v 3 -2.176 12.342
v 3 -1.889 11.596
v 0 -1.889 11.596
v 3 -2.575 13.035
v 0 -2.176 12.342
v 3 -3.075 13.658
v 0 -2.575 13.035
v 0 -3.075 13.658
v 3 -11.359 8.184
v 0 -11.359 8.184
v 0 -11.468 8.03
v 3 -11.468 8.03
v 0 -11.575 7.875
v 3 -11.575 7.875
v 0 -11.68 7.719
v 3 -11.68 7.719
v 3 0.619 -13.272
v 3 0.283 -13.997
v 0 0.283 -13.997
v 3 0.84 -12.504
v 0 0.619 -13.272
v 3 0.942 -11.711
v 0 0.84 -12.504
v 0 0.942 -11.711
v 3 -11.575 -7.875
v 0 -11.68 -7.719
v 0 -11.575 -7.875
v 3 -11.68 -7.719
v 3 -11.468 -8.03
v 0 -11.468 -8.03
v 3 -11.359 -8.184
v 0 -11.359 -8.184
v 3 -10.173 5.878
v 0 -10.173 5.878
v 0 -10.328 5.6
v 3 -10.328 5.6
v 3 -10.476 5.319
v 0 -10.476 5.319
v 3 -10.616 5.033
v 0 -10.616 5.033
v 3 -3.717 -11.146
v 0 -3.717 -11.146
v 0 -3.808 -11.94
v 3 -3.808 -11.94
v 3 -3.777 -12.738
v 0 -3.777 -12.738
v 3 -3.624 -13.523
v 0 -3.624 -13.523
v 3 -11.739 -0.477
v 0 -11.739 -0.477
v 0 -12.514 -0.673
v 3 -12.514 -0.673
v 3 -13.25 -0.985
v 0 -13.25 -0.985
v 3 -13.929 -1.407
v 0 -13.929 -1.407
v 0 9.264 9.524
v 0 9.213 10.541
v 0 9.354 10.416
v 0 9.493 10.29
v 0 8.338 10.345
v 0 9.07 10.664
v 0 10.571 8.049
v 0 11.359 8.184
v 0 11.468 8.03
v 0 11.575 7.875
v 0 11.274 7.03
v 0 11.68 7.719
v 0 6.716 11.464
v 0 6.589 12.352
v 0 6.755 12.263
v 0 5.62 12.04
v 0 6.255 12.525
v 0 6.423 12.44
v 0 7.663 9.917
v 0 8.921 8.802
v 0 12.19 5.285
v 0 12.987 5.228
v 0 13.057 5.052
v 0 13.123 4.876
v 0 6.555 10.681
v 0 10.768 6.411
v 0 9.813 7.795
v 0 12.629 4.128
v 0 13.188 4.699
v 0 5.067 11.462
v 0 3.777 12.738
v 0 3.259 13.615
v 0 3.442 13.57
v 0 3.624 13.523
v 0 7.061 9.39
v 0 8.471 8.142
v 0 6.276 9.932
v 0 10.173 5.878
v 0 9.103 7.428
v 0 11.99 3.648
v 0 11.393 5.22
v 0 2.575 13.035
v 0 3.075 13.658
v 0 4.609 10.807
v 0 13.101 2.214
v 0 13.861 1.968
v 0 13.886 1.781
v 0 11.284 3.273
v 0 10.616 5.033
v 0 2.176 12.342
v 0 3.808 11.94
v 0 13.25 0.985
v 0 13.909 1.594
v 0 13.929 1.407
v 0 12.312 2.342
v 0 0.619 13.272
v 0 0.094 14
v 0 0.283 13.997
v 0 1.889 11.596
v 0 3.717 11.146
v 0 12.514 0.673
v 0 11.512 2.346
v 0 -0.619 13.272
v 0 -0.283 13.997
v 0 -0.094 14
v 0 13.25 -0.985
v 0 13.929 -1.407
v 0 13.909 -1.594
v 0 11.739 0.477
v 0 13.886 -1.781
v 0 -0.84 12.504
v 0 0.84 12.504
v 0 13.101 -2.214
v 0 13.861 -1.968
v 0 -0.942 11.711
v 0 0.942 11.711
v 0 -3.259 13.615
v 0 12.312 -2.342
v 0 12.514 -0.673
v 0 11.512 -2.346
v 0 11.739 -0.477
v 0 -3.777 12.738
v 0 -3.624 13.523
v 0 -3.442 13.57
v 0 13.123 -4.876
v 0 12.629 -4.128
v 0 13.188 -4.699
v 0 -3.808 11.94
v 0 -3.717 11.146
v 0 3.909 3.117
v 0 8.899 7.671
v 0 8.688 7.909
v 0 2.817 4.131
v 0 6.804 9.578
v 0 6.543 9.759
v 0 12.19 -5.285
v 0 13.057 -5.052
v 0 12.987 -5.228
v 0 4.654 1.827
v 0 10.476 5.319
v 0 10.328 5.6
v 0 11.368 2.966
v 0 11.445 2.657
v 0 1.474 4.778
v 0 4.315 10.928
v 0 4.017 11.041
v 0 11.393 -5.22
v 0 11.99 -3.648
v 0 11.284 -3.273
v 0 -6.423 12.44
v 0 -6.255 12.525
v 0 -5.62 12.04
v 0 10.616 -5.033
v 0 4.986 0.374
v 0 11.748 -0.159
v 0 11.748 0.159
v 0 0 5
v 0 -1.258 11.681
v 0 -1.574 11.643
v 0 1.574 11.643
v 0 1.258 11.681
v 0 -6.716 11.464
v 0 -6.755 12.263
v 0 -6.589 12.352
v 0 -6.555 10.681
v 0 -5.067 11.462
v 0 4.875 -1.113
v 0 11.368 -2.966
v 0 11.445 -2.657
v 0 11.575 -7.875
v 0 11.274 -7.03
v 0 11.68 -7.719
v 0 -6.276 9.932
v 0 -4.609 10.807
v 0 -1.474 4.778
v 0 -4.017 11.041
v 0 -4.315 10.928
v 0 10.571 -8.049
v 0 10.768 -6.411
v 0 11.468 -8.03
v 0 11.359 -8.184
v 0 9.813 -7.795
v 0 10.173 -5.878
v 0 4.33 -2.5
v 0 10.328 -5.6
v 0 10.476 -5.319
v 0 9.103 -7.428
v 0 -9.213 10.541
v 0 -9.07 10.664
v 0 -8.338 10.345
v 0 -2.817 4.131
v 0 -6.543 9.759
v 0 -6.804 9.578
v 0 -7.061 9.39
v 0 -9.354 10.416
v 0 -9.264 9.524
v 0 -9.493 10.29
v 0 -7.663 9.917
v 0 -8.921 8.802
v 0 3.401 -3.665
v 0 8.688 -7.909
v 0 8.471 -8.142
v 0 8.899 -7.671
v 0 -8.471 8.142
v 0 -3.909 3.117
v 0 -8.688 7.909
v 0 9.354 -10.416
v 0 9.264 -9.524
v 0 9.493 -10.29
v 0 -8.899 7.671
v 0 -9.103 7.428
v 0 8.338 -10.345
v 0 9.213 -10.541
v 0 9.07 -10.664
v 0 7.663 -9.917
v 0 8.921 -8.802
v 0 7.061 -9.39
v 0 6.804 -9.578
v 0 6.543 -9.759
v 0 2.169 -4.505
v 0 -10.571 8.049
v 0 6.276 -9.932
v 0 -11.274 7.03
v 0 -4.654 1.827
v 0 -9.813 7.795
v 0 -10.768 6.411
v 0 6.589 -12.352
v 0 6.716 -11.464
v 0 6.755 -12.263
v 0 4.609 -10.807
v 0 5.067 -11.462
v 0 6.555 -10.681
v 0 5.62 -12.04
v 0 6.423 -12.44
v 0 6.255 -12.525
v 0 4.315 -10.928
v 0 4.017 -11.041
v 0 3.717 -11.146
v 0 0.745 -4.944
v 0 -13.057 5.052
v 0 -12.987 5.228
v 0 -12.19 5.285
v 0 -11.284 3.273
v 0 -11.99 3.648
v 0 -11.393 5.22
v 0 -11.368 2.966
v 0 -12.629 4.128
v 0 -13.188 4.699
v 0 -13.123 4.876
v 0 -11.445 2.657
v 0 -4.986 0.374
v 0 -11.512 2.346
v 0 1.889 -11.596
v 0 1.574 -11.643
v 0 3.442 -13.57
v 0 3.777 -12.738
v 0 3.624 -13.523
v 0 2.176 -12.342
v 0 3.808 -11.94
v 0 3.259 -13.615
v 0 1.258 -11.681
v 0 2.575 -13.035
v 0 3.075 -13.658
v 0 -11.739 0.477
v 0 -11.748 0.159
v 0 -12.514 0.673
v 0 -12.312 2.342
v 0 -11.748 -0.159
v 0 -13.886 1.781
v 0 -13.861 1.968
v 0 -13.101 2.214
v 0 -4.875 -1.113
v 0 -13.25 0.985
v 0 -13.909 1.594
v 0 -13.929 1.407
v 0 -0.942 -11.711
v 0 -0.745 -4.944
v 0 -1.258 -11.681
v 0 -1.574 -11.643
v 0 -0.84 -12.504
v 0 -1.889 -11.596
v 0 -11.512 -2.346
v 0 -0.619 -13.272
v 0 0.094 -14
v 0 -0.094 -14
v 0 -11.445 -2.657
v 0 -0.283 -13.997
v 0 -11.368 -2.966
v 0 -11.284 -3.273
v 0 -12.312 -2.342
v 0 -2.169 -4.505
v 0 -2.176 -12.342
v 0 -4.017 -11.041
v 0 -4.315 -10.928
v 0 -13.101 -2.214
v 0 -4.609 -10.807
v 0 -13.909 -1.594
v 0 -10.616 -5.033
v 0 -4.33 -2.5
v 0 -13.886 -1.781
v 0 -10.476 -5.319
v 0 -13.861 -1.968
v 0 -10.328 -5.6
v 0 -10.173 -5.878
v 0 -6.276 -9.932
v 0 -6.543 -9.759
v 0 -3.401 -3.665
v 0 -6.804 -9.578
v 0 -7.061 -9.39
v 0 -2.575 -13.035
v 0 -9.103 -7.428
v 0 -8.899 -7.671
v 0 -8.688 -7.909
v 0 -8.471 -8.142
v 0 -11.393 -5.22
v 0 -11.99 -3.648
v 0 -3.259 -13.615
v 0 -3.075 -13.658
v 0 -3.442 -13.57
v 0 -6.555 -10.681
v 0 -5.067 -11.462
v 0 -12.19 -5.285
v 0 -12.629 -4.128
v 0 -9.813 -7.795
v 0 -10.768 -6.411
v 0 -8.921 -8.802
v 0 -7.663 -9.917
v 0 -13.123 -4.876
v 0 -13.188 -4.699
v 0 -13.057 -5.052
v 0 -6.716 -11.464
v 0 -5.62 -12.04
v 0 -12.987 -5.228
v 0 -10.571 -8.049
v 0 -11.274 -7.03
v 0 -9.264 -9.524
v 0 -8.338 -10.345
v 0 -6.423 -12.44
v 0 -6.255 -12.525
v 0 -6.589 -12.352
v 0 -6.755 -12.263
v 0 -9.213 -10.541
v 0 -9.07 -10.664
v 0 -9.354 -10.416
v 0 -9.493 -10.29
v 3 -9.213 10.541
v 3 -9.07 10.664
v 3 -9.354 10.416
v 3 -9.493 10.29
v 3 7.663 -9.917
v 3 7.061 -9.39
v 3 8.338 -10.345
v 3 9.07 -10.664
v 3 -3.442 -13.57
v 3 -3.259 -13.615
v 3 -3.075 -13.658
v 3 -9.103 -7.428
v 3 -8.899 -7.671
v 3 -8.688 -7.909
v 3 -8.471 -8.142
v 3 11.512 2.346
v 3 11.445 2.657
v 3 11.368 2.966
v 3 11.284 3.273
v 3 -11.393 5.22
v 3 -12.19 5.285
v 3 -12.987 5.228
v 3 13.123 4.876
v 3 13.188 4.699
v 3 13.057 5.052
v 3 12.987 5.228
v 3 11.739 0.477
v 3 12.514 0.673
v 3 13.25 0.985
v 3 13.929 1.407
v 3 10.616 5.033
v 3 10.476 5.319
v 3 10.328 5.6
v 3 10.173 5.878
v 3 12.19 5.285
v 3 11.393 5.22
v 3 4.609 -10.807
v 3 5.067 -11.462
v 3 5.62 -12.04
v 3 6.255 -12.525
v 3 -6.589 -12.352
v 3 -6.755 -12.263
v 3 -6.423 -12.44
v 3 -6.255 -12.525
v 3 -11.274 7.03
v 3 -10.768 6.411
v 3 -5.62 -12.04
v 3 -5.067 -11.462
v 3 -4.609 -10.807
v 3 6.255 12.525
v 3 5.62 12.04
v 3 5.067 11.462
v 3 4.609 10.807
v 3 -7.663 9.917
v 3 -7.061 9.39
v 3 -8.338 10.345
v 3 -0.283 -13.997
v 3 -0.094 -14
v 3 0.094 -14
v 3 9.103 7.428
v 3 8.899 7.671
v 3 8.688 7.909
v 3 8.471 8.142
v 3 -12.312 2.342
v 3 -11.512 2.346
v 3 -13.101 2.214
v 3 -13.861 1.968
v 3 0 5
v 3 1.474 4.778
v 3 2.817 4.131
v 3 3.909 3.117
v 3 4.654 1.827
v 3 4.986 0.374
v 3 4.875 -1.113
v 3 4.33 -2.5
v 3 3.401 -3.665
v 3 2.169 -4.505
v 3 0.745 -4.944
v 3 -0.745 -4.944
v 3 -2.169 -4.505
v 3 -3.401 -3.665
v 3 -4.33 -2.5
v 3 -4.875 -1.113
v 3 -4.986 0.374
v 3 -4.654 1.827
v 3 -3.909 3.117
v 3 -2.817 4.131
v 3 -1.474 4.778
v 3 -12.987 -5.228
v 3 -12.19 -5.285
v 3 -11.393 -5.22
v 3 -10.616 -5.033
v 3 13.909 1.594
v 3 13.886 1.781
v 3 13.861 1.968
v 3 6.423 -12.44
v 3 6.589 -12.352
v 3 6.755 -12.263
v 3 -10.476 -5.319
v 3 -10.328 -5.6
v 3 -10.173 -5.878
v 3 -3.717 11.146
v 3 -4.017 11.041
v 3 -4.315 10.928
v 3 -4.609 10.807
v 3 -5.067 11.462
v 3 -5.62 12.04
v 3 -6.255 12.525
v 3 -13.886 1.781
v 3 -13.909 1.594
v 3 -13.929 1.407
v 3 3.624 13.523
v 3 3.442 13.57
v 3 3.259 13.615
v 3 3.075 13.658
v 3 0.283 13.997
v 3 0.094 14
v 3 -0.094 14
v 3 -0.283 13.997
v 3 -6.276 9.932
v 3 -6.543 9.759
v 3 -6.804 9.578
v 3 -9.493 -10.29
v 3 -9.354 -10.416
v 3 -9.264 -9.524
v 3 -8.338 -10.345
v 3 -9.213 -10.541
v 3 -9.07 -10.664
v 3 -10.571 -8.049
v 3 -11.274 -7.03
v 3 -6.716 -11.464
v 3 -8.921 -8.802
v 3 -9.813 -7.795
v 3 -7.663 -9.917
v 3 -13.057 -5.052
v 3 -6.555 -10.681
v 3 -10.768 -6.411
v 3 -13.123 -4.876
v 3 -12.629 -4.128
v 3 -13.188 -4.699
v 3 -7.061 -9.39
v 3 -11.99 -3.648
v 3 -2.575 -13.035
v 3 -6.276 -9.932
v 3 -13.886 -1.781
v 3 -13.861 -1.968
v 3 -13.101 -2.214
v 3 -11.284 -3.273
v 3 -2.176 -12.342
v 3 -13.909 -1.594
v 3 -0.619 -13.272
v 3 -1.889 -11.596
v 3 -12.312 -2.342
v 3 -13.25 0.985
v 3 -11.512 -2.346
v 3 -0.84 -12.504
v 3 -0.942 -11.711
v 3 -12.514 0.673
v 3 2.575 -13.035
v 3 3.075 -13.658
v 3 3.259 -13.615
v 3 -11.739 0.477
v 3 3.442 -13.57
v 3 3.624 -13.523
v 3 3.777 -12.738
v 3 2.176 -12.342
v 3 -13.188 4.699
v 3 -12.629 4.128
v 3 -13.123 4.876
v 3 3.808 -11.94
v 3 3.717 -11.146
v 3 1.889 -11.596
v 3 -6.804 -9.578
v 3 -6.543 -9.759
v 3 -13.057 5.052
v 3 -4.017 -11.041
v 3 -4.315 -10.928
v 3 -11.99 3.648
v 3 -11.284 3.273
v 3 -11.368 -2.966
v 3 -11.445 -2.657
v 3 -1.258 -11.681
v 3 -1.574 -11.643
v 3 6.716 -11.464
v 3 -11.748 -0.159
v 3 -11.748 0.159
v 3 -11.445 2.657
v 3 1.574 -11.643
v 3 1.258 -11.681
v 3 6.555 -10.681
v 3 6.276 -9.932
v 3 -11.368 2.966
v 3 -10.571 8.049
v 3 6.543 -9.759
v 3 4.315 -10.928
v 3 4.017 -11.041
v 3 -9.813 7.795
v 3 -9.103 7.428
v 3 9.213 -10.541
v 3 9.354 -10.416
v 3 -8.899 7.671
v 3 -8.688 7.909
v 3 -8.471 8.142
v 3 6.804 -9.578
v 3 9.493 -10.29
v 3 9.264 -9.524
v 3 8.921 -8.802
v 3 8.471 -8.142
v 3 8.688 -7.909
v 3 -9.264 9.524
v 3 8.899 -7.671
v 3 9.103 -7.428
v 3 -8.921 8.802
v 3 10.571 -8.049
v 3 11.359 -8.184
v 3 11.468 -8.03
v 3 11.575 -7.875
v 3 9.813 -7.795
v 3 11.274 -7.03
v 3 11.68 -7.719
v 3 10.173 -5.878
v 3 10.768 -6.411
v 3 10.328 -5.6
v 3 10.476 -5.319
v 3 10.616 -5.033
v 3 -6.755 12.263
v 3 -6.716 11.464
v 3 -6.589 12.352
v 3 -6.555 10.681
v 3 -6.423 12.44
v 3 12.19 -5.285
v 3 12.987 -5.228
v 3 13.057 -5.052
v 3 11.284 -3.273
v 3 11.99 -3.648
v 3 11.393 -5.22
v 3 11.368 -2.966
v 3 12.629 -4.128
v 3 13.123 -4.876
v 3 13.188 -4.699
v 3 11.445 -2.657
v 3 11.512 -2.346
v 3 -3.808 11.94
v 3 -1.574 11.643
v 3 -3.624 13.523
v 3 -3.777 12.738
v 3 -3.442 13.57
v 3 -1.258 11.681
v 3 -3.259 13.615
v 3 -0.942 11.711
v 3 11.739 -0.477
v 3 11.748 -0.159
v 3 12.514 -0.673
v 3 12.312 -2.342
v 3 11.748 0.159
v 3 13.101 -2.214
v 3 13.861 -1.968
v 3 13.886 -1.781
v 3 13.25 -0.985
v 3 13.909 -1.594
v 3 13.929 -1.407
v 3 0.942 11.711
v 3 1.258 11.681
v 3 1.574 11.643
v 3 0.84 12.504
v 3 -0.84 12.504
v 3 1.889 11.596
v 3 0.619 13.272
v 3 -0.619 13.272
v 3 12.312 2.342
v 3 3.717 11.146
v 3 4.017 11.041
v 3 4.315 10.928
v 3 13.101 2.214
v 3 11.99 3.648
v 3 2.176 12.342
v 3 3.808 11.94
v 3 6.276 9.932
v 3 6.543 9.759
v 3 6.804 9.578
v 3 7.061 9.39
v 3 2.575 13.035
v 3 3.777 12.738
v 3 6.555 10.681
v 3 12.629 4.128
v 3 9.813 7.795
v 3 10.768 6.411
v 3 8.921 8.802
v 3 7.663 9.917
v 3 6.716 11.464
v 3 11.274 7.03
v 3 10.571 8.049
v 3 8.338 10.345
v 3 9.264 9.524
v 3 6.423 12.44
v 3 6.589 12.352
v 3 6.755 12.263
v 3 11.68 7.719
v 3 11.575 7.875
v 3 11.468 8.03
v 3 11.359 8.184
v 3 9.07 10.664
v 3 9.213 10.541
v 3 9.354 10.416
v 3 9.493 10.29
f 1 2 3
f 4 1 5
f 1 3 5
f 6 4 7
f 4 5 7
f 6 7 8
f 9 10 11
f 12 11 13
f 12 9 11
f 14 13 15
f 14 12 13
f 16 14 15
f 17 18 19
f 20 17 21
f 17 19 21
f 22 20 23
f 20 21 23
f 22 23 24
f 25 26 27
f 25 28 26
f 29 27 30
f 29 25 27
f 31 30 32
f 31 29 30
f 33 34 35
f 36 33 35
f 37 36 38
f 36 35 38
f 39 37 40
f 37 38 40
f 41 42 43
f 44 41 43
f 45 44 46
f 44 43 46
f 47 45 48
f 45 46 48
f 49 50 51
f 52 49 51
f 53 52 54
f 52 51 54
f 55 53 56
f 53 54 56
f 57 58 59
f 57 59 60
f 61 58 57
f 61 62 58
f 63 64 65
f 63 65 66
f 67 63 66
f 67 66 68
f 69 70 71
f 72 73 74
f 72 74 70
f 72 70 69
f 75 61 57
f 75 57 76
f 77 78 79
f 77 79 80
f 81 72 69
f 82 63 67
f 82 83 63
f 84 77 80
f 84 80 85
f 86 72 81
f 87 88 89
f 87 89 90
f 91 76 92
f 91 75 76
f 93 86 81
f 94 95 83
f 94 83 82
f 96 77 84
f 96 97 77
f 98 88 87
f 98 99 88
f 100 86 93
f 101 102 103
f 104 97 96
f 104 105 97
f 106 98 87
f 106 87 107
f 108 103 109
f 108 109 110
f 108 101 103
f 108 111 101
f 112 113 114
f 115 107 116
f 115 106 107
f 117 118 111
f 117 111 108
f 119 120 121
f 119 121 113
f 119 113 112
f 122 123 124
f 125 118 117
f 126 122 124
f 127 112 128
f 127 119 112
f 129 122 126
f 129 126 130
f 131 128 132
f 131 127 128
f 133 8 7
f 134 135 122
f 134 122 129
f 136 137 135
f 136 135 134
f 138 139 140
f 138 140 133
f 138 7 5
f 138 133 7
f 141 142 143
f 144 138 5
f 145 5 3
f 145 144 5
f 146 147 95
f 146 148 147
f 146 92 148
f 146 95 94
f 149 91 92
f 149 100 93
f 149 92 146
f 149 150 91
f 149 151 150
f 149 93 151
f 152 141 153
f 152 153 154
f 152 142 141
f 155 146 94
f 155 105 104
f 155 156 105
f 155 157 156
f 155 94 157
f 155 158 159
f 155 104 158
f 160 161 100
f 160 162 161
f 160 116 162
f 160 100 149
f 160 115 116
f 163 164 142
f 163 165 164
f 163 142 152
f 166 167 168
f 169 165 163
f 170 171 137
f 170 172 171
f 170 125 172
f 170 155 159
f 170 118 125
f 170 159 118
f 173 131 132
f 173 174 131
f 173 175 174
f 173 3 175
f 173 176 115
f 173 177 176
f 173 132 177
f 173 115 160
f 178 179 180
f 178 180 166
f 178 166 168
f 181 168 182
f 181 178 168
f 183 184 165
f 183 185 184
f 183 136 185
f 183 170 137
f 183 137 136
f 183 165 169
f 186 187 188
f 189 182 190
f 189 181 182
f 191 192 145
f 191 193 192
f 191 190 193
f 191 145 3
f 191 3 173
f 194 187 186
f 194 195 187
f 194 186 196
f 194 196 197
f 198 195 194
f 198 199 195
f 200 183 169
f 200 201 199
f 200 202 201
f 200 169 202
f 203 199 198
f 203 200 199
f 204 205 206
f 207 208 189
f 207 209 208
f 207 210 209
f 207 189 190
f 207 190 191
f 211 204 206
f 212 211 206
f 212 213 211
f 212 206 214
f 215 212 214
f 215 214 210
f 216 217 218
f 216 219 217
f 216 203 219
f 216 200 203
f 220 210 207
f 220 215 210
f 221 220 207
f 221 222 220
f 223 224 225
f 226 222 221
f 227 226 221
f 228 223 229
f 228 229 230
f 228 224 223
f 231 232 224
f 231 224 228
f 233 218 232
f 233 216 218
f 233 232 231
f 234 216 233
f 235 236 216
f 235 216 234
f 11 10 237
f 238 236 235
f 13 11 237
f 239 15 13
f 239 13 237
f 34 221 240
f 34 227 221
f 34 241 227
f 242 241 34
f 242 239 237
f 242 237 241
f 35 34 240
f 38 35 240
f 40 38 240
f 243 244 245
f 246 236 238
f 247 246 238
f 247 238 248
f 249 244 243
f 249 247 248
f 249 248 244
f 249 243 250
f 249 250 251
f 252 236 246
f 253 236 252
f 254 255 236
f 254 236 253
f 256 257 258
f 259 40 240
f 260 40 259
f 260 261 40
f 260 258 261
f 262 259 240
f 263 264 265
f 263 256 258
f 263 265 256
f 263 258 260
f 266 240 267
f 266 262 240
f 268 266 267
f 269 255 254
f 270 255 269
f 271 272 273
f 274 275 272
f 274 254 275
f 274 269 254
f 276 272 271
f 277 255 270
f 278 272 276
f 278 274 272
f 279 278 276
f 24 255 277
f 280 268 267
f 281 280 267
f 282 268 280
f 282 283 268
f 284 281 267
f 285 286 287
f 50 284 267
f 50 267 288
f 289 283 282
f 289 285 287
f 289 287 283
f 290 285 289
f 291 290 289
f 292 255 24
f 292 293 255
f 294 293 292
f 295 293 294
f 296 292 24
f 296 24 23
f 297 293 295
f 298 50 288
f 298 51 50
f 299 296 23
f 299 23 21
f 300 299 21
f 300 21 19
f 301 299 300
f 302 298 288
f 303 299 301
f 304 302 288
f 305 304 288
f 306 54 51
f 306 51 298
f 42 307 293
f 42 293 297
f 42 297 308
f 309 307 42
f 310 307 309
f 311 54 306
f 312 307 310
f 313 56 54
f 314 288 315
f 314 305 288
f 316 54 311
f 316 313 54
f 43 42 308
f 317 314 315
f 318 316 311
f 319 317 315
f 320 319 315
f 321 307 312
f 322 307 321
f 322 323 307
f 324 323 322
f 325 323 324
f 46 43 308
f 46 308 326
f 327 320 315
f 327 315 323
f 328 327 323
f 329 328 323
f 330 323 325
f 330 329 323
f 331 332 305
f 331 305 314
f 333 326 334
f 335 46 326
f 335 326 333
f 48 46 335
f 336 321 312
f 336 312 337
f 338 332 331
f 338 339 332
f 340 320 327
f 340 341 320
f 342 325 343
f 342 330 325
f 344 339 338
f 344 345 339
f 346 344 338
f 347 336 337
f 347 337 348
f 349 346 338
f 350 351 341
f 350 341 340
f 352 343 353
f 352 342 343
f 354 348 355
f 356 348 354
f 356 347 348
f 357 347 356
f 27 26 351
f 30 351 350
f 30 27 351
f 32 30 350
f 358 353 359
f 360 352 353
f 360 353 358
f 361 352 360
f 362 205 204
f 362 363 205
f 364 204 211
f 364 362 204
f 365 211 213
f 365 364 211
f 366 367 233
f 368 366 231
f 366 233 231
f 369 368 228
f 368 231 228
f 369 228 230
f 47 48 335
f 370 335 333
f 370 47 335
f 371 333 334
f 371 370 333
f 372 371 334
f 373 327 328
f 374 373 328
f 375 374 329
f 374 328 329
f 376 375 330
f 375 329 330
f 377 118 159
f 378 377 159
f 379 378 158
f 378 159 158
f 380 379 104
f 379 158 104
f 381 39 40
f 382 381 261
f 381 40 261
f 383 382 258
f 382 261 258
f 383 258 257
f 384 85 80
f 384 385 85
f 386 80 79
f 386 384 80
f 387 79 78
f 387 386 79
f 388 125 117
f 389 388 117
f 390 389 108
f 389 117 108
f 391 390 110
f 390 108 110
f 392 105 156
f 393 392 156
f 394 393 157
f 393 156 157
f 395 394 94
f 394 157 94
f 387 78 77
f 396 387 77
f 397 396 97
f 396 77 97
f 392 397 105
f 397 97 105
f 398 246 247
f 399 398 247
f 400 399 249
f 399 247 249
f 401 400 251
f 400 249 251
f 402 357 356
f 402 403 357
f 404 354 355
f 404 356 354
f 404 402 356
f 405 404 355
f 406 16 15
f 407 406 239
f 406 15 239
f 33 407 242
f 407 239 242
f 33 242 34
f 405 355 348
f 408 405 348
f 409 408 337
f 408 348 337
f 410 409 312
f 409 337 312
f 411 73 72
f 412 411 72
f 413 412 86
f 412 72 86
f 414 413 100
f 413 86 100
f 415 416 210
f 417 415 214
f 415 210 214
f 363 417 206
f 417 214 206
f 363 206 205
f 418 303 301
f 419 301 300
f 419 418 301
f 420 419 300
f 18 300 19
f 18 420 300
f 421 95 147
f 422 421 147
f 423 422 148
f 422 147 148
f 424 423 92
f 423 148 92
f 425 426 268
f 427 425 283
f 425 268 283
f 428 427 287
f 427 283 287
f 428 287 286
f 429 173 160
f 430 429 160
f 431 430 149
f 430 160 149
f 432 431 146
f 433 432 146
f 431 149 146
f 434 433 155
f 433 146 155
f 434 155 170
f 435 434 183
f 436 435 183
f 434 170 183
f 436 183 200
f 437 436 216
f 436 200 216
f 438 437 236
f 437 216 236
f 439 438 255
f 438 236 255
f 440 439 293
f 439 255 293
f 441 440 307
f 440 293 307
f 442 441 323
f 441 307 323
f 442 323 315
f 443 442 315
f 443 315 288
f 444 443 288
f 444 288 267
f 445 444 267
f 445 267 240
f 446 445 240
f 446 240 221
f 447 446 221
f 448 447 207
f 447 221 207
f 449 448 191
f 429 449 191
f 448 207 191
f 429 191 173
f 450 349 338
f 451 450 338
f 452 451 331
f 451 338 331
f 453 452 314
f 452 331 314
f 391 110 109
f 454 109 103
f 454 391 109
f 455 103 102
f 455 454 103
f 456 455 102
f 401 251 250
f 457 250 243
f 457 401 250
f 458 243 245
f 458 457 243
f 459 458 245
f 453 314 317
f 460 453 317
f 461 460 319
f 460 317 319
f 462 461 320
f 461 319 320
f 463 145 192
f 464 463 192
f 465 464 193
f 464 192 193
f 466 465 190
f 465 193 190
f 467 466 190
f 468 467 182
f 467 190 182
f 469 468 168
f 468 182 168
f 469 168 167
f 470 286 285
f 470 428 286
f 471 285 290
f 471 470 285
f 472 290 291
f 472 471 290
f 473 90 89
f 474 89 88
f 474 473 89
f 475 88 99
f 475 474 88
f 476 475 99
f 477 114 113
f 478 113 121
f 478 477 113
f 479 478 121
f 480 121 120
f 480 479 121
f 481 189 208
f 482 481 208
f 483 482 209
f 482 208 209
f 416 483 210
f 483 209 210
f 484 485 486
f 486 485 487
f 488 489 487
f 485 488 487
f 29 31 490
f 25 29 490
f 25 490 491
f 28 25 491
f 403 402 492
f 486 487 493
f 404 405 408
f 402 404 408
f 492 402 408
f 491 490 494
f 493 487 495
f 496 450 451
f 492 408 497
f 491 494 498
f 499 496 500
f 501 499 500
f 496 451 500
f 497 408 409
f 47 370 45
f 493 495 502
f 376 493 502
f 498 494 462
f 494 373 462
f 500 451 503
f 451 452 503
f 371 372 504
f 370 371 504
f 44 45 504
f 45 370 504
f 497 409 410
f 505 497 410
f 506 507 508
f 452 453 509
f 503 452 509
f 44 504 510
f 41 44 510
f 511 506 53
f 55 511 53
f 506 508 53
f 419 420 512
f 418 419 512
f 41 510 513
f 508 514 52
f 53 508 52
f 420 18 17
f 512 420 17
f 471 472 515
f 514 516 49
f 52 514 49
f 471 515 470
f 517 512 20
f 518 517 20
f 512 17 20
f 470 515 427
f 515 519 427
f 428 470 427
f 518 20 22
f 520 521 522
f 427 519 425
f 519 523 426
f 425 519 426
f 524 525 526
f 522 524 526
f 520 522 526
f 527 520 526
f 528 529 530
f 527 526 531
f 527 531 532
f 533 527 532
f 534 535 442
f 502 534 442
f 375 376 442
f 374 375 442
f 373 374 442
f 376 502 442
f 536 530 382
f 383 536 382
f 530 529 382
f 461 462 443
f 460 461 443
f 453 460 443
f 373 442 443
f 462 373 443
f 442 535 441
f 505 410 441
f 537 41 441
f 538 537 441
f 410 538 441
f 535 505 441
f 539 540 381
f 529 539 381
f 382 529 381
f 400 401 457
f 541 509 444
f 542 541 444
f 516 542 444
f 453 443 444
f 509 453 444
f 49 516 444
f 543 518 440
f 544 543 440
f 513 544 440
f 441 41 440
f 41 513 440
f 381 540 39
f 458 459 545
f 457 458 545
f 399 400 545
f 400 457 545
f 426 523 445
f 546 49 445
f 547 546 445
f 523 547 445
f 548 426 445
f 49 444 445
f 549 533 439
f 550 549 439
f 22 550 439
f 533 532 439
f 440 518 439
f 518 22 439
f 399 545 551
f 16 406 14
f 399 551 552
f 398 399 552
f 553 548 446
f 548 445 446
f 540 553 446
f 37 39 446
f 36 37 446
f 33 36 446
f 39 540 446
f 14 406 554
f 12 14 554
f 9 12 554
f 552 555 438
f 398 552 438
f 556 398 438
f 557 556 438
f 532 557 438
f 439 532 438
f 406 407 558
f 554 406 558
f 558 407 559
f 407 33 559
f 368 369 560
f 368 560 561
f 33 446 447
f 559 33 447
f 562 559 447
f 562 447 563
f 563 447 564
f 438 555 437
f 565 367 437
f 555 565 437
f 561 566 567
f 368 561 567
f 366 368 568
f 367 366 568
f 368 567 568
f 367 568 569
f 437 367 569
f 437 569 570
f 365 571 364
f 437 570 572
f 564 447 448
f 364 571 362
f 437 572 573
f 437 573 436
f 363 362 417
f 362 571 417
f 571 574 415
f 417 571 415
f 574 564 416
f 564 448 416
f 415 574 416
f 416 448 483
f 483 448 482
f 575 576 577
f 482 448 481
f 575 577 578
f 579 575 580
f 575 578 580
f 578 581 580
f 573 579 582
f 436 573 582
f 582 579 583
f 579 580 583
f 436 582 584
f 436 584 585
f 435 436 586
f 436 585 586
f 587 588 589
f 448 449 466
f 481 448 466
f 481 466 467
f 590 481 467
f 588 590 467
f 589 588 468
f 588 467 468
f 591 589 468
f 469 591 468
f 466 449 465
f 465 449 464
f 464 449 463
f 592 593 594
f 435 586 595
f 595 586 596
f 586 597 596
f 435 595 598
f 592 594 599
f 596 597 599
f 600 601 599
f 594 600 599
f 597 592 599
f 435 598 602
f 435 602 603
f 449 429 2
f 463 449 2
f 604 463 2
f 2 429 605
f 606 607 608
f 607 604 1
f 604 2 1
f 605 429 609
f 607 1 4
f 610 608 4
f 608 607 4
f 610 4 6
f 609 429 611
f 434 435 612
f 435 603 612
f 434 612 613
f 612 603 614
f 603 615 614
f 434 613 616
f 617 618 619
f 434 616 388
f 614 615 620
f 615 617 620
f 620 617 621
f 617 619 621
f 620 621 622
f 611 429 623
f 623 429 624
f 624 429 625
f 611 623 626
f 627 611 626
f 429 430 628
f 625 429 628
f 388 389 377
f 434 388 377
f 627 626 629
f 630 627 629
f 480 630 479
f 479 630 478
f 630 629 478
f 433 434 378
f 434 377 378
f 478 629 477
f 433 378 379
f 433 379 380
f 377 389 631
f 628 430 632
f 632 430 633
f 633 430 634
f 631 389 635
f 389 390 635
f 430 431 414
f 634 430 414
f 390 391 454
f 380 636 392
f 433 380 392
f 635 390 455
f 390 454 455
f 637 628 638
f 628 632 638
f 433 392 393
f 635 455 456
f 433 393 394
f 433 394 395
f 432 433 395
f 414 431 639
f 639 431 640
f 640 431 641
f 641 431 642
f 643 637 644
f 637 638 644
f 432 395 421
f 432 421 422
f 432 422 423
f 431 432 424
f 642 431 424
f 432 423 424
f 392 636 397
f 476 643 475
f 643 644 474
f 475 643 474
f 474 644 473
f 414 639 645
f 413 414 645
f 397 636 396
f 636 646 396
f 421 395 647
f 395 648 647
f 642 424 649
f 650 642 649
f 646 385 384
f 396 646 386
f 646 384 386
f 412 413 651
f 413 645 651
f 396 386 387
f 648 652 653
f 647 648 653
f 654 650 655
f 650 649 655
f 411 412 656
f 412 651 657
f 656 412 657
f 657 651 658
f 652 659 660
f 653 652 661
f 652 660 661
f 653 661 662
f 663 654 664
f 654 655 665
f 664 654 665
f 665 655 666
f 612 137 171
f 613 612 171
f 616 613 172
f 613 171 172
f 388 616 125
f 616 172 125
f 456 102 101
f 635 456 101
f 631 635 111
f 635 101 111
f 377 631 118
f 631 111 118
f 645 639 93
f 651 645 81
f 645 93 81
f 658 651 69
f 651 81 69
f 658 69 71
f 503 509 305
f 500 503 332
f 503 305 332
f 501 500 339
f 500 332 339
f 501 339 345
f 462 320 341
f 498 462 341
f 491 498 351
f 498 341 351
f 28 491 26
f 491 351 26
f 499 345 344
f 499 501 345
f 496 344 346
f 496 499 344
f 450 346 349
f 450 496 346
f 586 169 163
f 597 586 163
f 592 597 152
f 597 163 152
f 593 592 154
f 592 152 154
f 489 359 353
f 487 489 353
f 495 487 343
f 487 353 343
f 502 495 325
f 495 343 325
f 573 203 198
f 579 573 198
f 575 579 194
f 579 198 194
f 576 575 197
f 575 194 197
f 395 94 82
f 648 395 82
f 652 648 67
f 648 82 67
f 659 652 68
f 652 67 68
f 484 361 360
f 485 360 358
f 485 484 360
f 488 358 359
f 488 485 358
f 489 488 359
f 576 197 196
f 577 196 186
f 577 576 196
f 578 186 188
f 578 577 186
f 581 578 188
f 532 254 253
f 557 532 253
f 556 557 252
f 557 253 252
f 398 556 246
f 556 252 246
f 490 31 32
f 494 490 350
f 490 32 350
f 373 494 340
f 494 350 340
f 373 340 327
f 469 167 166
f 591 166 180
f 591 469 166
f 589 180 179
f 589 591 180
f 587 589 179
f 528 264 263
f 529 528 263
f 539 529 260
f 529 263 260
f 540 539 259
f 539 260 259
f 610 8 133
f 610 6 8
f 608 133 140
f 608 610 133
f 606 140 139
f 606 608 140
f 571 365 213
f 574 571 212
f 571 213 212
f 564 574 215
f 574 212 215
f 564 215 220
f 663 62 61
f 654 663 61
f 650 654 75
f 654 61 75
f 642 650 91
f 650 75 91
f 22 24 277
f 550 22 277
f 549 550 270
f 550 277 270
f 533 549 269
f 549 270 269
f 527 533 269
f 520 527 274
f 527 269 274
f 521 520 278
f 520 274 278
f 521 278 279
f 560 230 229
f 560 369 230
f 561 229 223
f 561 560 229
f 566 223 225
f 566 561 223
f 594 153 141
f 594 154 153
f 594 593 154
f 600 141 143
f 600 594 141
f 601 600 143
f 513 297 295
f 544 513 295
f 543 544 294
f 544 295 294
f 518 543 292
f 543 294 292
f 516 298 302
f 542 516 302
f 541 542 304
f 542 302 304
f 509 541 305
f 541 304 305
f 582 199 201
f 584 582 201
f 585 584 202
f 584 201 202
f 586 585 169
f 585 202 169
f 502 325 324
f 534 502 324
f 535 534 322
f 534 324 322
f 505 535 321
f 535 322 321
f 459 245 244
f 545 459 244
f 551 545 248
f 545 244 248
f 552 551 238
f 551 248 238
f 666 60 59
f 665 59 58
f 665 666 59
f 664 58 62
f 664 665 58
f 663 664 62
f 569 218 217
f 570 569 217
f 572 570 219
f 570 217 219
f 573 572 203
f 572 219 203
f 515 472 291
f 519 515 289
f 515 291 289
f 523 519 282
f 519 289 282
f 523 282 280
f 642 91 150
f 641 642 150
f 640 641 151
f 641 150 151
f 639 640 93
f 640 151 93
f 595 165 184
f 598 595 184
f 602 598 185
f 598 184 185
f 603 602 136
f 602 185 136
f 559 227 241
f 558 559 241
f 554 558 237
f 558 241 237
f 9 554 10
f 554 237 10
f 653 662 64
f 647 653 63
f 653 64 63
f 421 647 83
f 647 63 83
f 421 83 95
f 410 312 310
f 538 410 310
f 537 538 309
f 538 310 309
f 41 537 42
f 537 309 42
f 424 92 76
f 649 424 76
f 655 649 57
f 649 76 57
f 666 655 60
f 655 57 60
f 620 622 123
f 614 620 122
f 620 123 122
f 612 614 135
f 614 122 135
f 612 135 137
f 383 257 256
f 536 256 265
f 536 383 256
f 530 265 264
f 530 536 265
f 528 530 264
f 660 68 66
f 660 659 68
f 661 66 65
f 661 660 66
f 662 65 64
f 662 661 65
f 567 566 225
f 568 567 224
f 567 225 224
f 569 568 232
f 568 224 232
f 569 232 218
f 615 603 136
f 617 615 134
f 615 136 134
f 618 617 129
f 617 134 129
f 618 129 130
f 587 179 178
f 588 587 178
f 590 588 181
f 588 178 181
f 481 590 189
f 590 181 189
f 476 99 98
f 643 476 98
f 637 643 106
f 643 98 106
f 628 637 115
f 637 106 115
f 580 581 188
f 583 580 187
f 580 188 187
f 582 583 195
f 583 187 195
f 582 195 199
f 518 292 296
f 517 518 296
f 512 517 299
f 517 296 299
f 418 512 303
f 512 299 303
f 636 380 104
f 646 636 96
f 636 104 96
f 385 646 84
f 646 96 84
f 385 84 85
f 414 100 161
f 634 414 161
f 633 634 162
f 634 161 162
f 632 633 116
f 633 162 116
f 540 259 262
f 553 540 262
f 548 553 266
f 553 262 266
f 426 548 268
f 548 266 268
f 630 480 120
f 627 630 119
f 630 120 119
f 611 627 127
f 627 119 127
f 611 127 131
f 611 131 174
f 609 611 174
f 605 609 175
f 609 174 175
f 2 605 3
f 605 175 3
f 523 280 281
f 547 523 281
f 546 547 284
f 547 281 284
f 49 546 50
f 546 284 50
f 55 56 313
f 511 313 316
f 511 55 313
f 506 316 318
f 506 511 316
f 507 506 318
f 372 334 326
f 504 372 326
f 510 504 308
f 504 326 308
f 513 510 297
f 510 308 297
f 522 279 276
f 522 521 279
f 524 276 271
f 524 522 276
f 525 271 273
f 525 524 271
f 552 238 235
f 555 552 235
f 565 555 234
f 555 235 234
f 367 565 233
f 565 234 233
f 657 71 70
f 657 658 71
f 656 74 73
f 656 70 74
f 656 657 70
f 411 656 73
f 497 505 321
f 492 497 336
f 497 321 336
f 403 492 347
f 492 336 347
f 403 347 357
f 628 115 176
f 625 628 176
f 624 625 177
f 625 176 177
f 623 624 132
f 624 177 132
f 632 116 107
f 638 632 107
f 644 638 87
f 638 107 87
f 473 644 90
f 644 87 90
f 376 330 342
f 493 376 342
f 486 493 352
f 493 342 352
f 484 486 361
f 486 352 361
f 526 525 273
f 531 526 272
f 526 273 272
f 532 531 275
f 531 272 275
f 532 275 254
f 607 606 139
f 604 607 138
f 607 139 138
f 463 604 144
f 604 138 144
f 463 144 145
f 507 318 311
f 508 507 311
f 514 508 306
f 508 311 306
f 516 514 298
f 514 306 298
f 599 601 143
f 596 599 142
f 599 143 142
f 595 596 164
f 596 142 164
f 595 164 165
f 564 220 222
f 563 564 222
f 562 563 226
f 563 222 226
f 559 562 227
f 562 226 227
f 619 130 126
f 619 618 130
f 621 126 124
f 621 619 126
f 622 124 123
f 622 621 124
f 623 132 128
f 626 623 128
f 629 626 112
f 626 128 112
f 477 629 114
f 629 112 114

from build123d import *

# Parameters (mm, degrees)
BASPROSKE_W         = 3
BASPROSKE_H         = 14
TOOTHCUT_DEPTH      = 21.024984395
TEETHCUTS_COUNT     = 26
TEETHCUTS_ANGLE     = 346.153846154
BORSKE_R            = 4
BORE_DEPTH          = 50.0000508
EXTRUDE_START       = -3
SKETCH_1_R          = 4
EXTRUDE_1_DEPTH     = 3
SKETCH_2_R          = 5
CUT_EXTRUDE_1_DEPTH = 3


with BuildPart() as part:
    # BasProSke → Base-Revolve (revolve)
    with BuildSketch(Plane(origin=(0, 0, 0), x_dir=(1, 0, 0), z_dir=(0, 1, 0)), mode=Mode.PRIVATE) as base_revolve_sk:
        with Locations((1.5, 7)):
            Rectangle(BASPROSKE_W, BASPROSKE_H)
    revolve(base_revolve_sk.sketch.rotate(Axis((-10, 0, 0), (1, 0, 0)), 180), axis=Axis((-10, 0, 0), (1, 0, 0)))

    # TooCutSke → ToothCut (cut, through all)
    with BuildSketch(Plane(origin=(0, 0, 0), x_dir=(0, 0, -1), z_dir=(1, 0, 0))):
        with BuildLine():
            ThreePointArc((0.476965065, 11.739314517), (0, 11.749), (-0.476965065, 11.739314517))
            ThreePointArc((-0.476965065, 11.739314517), (-0.82065865, 12.901686978), (-1.424117301, 13.952911348))
            ThreePointArc((-1.424117301, 13.952911348), (0, 14.0254), (1.424117301, 13.952911348))
            ThreePointArc((1.424117301, 13.952911348), (0.82065865, 12.901686978), (0.476965065, 11.739314517))
        make_face()
    toothcut = extrude(amount=TOOTHCUT_DEPTH, mode=Mode.SUBTRACT)

    # TeethCuts: ToothCut ×26 about axis
    teethcuts_axis = Axis((-10, 0, 0), (1, 0, 0))
    for i in range(1, TEETHCUTS_COUNT):
        add(toothcut.rotate(teethcuts_axis, i * TEETHCUTS_ANGLE / (TEETHCUTS_COUNT - 1)), mode=Mode.SUBTRACT)

    # BorSke → Bore (cut, symmetric)
    with BuildSketch(Plane(origin=(0, 0, 0), x_dir=(0, 0, -1), z_dir=(1, 0, 0))):
        with Locations(Location((0, 0, 0), (0, 0, 180))):
            Circle(BORSKE_R)
    extrude(amount=BORE_DEPTH, both=True, mode=Mode.SUBTRACT)

    # ｽｹｯﾁ1 → ﾎﾞｽ - 押し出し1 (add)
    with BuildSketch(Plane.ZY.offset(EXTRUDE_START)):
        Circle(SKETCH_1_R)
    extrude(amount=EXTRUDE_1_DEPTH)

    # ｽｹｯﾁ2 → ｶｯﾄ - 押し出し1 (cut)
    with BuildSketch(Plane.ZY):
        Circle(SKETCH_2_R)
    extrude(amount=-CUT_EXTRUDE_1_DEPTH, mode=Mode.SUBTRACT)


solid = part.part
